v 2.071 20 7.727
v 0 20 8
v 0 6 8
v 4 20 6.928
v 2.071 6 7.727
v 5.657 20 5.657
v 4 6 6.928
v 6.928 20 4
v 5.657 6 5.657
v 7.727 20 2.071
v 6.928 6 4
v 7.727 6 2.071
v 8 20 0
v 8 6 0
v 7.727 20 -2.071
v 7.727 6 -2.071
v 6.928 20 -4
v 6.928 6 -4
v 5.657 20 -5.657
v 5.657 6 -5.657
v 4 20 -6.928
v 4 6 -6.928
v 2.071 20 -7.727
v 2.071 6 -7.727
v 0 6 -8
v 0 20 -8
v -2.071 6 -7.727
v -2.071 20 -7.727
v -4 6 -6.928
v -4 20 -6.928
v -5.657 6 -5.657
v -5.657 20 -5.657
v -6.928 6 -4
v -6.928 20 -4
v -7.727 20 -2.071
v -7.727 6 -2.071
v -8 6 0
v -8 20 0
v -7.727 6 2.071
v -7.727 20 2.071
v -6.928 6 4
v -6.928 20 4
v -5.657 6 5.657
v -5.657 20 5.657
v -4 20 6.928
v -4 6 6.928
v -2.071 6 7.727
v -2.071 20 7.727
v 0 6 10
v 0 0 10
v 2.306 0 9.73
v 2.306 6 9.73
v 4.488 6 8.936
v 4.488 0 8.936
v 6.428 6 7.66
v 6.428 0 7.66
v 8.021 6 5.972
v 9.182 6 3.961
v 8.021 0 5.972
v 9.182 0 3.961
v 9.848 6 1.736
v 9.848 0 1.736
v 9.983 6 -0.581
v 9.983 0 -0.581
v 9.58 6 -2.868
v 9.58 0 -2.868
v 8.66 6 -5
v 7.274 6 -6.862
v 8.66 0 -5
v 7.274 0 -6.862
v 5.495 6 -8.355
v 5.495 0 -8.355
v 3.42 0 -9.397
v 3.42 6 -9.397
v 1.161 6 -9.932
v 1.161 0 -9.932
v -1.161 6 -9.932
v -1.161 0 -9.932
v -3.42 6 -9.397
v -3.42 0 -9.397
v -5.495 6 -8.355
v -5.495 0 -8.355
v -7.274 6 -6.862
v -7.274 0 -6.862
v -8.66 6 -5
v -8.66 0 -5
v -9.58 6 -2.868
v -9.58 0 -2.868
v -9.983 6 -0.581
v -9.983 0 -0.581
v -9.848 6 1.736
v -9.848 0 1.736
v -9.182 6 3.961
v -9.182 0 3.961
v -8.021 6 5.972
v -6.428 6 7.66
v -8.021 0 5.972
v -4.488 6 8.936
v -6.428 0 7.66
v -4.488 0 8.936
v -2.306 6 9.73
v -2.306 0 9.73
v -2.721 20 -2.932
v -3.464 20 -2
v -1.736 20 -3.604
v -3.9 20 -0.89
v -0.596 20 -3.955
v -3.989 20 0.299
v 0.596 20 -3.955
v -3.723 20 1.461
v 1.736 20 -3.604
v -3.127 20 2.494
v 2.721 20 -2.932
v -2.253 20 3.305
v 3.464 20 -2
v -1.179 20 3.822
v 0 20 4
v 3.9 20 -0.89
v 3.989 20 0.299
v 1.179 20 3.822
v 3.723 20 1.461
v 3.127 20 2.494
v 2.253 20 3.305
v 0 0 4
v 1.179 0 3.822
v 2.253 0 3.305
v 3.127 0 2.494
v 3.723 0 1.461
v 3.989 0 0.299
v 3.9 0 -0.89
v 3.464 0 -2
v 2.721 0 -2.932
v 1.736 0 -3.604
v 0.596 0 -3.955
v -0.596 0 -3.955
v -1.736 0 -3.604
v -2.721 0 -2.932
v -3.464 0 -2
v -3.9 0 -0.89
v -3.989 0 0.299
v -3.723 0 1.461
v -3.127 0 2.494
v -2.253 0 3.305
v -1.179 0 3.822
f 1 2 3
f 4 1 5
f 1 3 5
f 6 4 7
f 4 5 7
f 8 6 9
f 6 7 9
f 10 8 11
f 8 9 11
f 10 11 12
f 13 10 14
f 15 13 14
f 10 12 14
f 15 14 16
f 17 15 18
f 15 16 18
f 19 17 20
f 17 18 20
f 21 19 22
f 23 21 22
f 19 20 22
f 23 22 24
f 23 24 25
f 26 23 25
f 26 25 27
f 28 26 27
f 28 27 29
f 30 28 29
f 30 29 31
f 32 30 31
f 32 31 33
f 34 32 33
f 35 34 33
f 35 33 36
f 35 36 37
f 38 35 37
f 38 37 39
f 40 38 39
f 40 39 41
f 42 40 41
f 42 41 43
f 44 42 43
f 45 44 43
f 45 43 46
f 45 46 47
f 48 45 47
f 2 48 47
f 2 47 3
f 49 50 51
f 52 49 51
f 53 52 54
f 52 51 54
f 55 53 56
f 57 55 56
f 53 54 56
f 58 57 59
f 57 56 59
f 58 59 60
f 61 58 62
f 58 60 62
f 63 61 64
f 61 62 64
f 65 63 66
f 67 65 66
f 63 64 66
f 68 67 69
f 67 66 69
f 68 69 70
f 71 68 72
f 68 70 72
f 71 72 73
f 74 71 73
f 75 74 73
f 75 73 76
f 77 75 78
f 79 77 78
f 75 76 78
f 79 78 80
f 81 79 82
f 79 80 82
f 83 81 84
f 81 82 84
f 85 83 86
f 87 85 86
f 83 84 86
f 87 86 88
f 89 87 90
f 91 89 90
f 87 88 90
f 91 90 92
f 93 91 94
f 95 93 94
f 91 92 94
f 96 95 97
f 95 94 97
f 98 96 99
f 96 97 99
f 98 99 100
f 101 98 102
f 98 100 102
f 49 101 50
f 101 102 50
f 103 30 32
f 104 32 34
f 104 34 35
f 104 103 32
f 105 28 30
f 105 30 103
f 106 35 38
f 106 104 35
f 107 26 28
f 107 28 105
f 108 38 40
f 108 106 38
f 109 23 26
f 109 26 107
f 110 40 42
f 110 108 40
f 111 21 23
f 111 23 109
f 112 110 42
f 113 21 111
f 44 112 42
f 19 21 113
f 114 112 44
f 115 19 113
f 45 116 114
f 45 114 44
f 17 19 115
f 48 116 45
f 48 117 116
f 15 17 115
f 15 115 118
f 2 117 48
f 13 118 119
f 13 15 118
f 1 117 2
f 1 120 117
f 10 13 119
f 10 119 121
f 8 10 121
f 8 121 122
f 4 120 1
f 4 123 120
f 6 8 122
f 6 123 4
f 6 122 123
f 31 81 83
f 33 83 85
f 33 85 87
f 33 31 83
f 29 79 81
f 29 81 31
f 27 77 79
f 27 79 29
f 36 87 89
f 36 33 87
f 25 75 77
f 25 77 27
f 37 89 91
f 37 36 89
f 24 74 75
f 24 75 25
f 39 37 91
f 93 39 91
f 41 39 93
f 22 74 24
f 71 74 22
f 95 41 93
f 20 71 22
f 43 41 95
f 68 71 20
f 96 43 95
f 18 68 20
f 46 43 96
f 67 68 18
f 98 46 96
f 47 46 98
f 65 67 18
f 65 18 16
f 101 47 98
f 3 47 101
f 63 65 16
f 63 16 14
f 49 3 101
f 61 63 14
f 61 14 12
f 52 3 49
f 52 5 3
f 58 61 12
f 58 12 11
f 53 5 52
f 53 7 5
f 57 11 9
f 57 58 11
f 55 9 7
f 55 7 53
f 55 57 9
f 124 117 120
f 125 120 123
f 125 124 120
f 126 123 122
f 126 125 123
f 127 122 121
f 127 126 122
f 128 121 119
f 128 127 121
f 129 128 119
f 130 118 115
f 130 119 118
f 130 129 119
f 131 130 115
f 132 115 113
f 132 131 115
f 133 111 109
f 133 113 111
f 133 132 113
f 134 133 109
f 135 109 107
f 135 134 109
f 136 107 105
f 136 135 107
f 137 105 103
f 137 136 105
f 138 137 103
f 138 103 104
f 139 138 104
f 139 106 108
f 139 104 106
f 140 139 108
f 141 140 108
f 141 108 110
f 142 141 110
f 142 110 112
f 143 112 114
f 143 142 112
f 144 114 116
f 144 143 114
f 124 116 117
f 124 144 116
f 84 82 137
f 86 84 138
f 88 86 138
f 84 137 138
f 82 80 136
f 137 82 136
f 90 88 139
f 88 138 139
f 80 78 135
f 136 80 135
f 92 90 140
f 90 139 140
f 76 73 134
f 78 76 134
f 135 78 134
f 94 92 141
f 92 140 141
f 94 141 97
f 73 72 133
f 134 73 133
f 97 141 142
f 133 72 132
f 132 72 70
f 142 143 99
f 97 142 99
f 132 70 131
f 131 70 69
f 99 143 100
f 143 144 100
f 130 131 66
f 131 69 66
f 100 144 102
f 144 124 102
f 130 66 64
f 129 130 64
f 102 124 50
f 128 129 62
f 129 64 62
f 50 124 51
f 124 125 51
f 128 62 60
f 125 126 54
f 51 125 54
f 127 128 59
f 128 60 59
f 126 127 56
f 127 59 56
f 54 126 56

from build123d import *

# Parameters (mm, degrees)
SKETCH2_R           = 8
BOSS_EXTRUDE1_DEPTH = 20
SKETCH3_R           = 10
BOSS_EXTRUDE2_DEPTH = 6
SKETCH1_R           = 4
CUT_EXTRUDE1_DEPTH  = 25.494897428


with BuildPart() as part:
    # Sketch2 → Boss-Extrude1 (new body)
    with BuildSketch(Plane(origin=(0, 0, 0), x_dir=(1, 0, 0), z_dir=(0, 1, 0))):
        with Locations(Location((0, 0, 0), (0, 0, 270))):
            Circle(SKETCH2_R)
    extrude(amount=BOSS_EXTRUDE1_DEPTH)

    # Sketch3 → Boss-Extrude2 (add)
    with BuildSketch(Plane(origin=(0, 0, 0), x_dir=(1, 0, 0), z_dir=(0, 1, 0))):
        with Locations(Location((0, 0, 0), (0, 0, 270))):
            Circle(SKETCH3_R)
    extrude(amount=BOSS_EXTRUDE2_DEPTH)

    # Sketch1 → Cut-Extrude1 (cut, through all)
    with BuildSketch(Plane(origin=(0, 0, 0), x_dir=(1, 0, 0), z_dir=(0, 1, 0))):
        with Locations(Location((0, 0, 0), (0, 0, 270))):
            Circle(SKETCH1_R)
    extrude(amount=CUT_EXTRUDE1_DEPTH, mode=Mode.SUBTRACT)


solid = part.part
